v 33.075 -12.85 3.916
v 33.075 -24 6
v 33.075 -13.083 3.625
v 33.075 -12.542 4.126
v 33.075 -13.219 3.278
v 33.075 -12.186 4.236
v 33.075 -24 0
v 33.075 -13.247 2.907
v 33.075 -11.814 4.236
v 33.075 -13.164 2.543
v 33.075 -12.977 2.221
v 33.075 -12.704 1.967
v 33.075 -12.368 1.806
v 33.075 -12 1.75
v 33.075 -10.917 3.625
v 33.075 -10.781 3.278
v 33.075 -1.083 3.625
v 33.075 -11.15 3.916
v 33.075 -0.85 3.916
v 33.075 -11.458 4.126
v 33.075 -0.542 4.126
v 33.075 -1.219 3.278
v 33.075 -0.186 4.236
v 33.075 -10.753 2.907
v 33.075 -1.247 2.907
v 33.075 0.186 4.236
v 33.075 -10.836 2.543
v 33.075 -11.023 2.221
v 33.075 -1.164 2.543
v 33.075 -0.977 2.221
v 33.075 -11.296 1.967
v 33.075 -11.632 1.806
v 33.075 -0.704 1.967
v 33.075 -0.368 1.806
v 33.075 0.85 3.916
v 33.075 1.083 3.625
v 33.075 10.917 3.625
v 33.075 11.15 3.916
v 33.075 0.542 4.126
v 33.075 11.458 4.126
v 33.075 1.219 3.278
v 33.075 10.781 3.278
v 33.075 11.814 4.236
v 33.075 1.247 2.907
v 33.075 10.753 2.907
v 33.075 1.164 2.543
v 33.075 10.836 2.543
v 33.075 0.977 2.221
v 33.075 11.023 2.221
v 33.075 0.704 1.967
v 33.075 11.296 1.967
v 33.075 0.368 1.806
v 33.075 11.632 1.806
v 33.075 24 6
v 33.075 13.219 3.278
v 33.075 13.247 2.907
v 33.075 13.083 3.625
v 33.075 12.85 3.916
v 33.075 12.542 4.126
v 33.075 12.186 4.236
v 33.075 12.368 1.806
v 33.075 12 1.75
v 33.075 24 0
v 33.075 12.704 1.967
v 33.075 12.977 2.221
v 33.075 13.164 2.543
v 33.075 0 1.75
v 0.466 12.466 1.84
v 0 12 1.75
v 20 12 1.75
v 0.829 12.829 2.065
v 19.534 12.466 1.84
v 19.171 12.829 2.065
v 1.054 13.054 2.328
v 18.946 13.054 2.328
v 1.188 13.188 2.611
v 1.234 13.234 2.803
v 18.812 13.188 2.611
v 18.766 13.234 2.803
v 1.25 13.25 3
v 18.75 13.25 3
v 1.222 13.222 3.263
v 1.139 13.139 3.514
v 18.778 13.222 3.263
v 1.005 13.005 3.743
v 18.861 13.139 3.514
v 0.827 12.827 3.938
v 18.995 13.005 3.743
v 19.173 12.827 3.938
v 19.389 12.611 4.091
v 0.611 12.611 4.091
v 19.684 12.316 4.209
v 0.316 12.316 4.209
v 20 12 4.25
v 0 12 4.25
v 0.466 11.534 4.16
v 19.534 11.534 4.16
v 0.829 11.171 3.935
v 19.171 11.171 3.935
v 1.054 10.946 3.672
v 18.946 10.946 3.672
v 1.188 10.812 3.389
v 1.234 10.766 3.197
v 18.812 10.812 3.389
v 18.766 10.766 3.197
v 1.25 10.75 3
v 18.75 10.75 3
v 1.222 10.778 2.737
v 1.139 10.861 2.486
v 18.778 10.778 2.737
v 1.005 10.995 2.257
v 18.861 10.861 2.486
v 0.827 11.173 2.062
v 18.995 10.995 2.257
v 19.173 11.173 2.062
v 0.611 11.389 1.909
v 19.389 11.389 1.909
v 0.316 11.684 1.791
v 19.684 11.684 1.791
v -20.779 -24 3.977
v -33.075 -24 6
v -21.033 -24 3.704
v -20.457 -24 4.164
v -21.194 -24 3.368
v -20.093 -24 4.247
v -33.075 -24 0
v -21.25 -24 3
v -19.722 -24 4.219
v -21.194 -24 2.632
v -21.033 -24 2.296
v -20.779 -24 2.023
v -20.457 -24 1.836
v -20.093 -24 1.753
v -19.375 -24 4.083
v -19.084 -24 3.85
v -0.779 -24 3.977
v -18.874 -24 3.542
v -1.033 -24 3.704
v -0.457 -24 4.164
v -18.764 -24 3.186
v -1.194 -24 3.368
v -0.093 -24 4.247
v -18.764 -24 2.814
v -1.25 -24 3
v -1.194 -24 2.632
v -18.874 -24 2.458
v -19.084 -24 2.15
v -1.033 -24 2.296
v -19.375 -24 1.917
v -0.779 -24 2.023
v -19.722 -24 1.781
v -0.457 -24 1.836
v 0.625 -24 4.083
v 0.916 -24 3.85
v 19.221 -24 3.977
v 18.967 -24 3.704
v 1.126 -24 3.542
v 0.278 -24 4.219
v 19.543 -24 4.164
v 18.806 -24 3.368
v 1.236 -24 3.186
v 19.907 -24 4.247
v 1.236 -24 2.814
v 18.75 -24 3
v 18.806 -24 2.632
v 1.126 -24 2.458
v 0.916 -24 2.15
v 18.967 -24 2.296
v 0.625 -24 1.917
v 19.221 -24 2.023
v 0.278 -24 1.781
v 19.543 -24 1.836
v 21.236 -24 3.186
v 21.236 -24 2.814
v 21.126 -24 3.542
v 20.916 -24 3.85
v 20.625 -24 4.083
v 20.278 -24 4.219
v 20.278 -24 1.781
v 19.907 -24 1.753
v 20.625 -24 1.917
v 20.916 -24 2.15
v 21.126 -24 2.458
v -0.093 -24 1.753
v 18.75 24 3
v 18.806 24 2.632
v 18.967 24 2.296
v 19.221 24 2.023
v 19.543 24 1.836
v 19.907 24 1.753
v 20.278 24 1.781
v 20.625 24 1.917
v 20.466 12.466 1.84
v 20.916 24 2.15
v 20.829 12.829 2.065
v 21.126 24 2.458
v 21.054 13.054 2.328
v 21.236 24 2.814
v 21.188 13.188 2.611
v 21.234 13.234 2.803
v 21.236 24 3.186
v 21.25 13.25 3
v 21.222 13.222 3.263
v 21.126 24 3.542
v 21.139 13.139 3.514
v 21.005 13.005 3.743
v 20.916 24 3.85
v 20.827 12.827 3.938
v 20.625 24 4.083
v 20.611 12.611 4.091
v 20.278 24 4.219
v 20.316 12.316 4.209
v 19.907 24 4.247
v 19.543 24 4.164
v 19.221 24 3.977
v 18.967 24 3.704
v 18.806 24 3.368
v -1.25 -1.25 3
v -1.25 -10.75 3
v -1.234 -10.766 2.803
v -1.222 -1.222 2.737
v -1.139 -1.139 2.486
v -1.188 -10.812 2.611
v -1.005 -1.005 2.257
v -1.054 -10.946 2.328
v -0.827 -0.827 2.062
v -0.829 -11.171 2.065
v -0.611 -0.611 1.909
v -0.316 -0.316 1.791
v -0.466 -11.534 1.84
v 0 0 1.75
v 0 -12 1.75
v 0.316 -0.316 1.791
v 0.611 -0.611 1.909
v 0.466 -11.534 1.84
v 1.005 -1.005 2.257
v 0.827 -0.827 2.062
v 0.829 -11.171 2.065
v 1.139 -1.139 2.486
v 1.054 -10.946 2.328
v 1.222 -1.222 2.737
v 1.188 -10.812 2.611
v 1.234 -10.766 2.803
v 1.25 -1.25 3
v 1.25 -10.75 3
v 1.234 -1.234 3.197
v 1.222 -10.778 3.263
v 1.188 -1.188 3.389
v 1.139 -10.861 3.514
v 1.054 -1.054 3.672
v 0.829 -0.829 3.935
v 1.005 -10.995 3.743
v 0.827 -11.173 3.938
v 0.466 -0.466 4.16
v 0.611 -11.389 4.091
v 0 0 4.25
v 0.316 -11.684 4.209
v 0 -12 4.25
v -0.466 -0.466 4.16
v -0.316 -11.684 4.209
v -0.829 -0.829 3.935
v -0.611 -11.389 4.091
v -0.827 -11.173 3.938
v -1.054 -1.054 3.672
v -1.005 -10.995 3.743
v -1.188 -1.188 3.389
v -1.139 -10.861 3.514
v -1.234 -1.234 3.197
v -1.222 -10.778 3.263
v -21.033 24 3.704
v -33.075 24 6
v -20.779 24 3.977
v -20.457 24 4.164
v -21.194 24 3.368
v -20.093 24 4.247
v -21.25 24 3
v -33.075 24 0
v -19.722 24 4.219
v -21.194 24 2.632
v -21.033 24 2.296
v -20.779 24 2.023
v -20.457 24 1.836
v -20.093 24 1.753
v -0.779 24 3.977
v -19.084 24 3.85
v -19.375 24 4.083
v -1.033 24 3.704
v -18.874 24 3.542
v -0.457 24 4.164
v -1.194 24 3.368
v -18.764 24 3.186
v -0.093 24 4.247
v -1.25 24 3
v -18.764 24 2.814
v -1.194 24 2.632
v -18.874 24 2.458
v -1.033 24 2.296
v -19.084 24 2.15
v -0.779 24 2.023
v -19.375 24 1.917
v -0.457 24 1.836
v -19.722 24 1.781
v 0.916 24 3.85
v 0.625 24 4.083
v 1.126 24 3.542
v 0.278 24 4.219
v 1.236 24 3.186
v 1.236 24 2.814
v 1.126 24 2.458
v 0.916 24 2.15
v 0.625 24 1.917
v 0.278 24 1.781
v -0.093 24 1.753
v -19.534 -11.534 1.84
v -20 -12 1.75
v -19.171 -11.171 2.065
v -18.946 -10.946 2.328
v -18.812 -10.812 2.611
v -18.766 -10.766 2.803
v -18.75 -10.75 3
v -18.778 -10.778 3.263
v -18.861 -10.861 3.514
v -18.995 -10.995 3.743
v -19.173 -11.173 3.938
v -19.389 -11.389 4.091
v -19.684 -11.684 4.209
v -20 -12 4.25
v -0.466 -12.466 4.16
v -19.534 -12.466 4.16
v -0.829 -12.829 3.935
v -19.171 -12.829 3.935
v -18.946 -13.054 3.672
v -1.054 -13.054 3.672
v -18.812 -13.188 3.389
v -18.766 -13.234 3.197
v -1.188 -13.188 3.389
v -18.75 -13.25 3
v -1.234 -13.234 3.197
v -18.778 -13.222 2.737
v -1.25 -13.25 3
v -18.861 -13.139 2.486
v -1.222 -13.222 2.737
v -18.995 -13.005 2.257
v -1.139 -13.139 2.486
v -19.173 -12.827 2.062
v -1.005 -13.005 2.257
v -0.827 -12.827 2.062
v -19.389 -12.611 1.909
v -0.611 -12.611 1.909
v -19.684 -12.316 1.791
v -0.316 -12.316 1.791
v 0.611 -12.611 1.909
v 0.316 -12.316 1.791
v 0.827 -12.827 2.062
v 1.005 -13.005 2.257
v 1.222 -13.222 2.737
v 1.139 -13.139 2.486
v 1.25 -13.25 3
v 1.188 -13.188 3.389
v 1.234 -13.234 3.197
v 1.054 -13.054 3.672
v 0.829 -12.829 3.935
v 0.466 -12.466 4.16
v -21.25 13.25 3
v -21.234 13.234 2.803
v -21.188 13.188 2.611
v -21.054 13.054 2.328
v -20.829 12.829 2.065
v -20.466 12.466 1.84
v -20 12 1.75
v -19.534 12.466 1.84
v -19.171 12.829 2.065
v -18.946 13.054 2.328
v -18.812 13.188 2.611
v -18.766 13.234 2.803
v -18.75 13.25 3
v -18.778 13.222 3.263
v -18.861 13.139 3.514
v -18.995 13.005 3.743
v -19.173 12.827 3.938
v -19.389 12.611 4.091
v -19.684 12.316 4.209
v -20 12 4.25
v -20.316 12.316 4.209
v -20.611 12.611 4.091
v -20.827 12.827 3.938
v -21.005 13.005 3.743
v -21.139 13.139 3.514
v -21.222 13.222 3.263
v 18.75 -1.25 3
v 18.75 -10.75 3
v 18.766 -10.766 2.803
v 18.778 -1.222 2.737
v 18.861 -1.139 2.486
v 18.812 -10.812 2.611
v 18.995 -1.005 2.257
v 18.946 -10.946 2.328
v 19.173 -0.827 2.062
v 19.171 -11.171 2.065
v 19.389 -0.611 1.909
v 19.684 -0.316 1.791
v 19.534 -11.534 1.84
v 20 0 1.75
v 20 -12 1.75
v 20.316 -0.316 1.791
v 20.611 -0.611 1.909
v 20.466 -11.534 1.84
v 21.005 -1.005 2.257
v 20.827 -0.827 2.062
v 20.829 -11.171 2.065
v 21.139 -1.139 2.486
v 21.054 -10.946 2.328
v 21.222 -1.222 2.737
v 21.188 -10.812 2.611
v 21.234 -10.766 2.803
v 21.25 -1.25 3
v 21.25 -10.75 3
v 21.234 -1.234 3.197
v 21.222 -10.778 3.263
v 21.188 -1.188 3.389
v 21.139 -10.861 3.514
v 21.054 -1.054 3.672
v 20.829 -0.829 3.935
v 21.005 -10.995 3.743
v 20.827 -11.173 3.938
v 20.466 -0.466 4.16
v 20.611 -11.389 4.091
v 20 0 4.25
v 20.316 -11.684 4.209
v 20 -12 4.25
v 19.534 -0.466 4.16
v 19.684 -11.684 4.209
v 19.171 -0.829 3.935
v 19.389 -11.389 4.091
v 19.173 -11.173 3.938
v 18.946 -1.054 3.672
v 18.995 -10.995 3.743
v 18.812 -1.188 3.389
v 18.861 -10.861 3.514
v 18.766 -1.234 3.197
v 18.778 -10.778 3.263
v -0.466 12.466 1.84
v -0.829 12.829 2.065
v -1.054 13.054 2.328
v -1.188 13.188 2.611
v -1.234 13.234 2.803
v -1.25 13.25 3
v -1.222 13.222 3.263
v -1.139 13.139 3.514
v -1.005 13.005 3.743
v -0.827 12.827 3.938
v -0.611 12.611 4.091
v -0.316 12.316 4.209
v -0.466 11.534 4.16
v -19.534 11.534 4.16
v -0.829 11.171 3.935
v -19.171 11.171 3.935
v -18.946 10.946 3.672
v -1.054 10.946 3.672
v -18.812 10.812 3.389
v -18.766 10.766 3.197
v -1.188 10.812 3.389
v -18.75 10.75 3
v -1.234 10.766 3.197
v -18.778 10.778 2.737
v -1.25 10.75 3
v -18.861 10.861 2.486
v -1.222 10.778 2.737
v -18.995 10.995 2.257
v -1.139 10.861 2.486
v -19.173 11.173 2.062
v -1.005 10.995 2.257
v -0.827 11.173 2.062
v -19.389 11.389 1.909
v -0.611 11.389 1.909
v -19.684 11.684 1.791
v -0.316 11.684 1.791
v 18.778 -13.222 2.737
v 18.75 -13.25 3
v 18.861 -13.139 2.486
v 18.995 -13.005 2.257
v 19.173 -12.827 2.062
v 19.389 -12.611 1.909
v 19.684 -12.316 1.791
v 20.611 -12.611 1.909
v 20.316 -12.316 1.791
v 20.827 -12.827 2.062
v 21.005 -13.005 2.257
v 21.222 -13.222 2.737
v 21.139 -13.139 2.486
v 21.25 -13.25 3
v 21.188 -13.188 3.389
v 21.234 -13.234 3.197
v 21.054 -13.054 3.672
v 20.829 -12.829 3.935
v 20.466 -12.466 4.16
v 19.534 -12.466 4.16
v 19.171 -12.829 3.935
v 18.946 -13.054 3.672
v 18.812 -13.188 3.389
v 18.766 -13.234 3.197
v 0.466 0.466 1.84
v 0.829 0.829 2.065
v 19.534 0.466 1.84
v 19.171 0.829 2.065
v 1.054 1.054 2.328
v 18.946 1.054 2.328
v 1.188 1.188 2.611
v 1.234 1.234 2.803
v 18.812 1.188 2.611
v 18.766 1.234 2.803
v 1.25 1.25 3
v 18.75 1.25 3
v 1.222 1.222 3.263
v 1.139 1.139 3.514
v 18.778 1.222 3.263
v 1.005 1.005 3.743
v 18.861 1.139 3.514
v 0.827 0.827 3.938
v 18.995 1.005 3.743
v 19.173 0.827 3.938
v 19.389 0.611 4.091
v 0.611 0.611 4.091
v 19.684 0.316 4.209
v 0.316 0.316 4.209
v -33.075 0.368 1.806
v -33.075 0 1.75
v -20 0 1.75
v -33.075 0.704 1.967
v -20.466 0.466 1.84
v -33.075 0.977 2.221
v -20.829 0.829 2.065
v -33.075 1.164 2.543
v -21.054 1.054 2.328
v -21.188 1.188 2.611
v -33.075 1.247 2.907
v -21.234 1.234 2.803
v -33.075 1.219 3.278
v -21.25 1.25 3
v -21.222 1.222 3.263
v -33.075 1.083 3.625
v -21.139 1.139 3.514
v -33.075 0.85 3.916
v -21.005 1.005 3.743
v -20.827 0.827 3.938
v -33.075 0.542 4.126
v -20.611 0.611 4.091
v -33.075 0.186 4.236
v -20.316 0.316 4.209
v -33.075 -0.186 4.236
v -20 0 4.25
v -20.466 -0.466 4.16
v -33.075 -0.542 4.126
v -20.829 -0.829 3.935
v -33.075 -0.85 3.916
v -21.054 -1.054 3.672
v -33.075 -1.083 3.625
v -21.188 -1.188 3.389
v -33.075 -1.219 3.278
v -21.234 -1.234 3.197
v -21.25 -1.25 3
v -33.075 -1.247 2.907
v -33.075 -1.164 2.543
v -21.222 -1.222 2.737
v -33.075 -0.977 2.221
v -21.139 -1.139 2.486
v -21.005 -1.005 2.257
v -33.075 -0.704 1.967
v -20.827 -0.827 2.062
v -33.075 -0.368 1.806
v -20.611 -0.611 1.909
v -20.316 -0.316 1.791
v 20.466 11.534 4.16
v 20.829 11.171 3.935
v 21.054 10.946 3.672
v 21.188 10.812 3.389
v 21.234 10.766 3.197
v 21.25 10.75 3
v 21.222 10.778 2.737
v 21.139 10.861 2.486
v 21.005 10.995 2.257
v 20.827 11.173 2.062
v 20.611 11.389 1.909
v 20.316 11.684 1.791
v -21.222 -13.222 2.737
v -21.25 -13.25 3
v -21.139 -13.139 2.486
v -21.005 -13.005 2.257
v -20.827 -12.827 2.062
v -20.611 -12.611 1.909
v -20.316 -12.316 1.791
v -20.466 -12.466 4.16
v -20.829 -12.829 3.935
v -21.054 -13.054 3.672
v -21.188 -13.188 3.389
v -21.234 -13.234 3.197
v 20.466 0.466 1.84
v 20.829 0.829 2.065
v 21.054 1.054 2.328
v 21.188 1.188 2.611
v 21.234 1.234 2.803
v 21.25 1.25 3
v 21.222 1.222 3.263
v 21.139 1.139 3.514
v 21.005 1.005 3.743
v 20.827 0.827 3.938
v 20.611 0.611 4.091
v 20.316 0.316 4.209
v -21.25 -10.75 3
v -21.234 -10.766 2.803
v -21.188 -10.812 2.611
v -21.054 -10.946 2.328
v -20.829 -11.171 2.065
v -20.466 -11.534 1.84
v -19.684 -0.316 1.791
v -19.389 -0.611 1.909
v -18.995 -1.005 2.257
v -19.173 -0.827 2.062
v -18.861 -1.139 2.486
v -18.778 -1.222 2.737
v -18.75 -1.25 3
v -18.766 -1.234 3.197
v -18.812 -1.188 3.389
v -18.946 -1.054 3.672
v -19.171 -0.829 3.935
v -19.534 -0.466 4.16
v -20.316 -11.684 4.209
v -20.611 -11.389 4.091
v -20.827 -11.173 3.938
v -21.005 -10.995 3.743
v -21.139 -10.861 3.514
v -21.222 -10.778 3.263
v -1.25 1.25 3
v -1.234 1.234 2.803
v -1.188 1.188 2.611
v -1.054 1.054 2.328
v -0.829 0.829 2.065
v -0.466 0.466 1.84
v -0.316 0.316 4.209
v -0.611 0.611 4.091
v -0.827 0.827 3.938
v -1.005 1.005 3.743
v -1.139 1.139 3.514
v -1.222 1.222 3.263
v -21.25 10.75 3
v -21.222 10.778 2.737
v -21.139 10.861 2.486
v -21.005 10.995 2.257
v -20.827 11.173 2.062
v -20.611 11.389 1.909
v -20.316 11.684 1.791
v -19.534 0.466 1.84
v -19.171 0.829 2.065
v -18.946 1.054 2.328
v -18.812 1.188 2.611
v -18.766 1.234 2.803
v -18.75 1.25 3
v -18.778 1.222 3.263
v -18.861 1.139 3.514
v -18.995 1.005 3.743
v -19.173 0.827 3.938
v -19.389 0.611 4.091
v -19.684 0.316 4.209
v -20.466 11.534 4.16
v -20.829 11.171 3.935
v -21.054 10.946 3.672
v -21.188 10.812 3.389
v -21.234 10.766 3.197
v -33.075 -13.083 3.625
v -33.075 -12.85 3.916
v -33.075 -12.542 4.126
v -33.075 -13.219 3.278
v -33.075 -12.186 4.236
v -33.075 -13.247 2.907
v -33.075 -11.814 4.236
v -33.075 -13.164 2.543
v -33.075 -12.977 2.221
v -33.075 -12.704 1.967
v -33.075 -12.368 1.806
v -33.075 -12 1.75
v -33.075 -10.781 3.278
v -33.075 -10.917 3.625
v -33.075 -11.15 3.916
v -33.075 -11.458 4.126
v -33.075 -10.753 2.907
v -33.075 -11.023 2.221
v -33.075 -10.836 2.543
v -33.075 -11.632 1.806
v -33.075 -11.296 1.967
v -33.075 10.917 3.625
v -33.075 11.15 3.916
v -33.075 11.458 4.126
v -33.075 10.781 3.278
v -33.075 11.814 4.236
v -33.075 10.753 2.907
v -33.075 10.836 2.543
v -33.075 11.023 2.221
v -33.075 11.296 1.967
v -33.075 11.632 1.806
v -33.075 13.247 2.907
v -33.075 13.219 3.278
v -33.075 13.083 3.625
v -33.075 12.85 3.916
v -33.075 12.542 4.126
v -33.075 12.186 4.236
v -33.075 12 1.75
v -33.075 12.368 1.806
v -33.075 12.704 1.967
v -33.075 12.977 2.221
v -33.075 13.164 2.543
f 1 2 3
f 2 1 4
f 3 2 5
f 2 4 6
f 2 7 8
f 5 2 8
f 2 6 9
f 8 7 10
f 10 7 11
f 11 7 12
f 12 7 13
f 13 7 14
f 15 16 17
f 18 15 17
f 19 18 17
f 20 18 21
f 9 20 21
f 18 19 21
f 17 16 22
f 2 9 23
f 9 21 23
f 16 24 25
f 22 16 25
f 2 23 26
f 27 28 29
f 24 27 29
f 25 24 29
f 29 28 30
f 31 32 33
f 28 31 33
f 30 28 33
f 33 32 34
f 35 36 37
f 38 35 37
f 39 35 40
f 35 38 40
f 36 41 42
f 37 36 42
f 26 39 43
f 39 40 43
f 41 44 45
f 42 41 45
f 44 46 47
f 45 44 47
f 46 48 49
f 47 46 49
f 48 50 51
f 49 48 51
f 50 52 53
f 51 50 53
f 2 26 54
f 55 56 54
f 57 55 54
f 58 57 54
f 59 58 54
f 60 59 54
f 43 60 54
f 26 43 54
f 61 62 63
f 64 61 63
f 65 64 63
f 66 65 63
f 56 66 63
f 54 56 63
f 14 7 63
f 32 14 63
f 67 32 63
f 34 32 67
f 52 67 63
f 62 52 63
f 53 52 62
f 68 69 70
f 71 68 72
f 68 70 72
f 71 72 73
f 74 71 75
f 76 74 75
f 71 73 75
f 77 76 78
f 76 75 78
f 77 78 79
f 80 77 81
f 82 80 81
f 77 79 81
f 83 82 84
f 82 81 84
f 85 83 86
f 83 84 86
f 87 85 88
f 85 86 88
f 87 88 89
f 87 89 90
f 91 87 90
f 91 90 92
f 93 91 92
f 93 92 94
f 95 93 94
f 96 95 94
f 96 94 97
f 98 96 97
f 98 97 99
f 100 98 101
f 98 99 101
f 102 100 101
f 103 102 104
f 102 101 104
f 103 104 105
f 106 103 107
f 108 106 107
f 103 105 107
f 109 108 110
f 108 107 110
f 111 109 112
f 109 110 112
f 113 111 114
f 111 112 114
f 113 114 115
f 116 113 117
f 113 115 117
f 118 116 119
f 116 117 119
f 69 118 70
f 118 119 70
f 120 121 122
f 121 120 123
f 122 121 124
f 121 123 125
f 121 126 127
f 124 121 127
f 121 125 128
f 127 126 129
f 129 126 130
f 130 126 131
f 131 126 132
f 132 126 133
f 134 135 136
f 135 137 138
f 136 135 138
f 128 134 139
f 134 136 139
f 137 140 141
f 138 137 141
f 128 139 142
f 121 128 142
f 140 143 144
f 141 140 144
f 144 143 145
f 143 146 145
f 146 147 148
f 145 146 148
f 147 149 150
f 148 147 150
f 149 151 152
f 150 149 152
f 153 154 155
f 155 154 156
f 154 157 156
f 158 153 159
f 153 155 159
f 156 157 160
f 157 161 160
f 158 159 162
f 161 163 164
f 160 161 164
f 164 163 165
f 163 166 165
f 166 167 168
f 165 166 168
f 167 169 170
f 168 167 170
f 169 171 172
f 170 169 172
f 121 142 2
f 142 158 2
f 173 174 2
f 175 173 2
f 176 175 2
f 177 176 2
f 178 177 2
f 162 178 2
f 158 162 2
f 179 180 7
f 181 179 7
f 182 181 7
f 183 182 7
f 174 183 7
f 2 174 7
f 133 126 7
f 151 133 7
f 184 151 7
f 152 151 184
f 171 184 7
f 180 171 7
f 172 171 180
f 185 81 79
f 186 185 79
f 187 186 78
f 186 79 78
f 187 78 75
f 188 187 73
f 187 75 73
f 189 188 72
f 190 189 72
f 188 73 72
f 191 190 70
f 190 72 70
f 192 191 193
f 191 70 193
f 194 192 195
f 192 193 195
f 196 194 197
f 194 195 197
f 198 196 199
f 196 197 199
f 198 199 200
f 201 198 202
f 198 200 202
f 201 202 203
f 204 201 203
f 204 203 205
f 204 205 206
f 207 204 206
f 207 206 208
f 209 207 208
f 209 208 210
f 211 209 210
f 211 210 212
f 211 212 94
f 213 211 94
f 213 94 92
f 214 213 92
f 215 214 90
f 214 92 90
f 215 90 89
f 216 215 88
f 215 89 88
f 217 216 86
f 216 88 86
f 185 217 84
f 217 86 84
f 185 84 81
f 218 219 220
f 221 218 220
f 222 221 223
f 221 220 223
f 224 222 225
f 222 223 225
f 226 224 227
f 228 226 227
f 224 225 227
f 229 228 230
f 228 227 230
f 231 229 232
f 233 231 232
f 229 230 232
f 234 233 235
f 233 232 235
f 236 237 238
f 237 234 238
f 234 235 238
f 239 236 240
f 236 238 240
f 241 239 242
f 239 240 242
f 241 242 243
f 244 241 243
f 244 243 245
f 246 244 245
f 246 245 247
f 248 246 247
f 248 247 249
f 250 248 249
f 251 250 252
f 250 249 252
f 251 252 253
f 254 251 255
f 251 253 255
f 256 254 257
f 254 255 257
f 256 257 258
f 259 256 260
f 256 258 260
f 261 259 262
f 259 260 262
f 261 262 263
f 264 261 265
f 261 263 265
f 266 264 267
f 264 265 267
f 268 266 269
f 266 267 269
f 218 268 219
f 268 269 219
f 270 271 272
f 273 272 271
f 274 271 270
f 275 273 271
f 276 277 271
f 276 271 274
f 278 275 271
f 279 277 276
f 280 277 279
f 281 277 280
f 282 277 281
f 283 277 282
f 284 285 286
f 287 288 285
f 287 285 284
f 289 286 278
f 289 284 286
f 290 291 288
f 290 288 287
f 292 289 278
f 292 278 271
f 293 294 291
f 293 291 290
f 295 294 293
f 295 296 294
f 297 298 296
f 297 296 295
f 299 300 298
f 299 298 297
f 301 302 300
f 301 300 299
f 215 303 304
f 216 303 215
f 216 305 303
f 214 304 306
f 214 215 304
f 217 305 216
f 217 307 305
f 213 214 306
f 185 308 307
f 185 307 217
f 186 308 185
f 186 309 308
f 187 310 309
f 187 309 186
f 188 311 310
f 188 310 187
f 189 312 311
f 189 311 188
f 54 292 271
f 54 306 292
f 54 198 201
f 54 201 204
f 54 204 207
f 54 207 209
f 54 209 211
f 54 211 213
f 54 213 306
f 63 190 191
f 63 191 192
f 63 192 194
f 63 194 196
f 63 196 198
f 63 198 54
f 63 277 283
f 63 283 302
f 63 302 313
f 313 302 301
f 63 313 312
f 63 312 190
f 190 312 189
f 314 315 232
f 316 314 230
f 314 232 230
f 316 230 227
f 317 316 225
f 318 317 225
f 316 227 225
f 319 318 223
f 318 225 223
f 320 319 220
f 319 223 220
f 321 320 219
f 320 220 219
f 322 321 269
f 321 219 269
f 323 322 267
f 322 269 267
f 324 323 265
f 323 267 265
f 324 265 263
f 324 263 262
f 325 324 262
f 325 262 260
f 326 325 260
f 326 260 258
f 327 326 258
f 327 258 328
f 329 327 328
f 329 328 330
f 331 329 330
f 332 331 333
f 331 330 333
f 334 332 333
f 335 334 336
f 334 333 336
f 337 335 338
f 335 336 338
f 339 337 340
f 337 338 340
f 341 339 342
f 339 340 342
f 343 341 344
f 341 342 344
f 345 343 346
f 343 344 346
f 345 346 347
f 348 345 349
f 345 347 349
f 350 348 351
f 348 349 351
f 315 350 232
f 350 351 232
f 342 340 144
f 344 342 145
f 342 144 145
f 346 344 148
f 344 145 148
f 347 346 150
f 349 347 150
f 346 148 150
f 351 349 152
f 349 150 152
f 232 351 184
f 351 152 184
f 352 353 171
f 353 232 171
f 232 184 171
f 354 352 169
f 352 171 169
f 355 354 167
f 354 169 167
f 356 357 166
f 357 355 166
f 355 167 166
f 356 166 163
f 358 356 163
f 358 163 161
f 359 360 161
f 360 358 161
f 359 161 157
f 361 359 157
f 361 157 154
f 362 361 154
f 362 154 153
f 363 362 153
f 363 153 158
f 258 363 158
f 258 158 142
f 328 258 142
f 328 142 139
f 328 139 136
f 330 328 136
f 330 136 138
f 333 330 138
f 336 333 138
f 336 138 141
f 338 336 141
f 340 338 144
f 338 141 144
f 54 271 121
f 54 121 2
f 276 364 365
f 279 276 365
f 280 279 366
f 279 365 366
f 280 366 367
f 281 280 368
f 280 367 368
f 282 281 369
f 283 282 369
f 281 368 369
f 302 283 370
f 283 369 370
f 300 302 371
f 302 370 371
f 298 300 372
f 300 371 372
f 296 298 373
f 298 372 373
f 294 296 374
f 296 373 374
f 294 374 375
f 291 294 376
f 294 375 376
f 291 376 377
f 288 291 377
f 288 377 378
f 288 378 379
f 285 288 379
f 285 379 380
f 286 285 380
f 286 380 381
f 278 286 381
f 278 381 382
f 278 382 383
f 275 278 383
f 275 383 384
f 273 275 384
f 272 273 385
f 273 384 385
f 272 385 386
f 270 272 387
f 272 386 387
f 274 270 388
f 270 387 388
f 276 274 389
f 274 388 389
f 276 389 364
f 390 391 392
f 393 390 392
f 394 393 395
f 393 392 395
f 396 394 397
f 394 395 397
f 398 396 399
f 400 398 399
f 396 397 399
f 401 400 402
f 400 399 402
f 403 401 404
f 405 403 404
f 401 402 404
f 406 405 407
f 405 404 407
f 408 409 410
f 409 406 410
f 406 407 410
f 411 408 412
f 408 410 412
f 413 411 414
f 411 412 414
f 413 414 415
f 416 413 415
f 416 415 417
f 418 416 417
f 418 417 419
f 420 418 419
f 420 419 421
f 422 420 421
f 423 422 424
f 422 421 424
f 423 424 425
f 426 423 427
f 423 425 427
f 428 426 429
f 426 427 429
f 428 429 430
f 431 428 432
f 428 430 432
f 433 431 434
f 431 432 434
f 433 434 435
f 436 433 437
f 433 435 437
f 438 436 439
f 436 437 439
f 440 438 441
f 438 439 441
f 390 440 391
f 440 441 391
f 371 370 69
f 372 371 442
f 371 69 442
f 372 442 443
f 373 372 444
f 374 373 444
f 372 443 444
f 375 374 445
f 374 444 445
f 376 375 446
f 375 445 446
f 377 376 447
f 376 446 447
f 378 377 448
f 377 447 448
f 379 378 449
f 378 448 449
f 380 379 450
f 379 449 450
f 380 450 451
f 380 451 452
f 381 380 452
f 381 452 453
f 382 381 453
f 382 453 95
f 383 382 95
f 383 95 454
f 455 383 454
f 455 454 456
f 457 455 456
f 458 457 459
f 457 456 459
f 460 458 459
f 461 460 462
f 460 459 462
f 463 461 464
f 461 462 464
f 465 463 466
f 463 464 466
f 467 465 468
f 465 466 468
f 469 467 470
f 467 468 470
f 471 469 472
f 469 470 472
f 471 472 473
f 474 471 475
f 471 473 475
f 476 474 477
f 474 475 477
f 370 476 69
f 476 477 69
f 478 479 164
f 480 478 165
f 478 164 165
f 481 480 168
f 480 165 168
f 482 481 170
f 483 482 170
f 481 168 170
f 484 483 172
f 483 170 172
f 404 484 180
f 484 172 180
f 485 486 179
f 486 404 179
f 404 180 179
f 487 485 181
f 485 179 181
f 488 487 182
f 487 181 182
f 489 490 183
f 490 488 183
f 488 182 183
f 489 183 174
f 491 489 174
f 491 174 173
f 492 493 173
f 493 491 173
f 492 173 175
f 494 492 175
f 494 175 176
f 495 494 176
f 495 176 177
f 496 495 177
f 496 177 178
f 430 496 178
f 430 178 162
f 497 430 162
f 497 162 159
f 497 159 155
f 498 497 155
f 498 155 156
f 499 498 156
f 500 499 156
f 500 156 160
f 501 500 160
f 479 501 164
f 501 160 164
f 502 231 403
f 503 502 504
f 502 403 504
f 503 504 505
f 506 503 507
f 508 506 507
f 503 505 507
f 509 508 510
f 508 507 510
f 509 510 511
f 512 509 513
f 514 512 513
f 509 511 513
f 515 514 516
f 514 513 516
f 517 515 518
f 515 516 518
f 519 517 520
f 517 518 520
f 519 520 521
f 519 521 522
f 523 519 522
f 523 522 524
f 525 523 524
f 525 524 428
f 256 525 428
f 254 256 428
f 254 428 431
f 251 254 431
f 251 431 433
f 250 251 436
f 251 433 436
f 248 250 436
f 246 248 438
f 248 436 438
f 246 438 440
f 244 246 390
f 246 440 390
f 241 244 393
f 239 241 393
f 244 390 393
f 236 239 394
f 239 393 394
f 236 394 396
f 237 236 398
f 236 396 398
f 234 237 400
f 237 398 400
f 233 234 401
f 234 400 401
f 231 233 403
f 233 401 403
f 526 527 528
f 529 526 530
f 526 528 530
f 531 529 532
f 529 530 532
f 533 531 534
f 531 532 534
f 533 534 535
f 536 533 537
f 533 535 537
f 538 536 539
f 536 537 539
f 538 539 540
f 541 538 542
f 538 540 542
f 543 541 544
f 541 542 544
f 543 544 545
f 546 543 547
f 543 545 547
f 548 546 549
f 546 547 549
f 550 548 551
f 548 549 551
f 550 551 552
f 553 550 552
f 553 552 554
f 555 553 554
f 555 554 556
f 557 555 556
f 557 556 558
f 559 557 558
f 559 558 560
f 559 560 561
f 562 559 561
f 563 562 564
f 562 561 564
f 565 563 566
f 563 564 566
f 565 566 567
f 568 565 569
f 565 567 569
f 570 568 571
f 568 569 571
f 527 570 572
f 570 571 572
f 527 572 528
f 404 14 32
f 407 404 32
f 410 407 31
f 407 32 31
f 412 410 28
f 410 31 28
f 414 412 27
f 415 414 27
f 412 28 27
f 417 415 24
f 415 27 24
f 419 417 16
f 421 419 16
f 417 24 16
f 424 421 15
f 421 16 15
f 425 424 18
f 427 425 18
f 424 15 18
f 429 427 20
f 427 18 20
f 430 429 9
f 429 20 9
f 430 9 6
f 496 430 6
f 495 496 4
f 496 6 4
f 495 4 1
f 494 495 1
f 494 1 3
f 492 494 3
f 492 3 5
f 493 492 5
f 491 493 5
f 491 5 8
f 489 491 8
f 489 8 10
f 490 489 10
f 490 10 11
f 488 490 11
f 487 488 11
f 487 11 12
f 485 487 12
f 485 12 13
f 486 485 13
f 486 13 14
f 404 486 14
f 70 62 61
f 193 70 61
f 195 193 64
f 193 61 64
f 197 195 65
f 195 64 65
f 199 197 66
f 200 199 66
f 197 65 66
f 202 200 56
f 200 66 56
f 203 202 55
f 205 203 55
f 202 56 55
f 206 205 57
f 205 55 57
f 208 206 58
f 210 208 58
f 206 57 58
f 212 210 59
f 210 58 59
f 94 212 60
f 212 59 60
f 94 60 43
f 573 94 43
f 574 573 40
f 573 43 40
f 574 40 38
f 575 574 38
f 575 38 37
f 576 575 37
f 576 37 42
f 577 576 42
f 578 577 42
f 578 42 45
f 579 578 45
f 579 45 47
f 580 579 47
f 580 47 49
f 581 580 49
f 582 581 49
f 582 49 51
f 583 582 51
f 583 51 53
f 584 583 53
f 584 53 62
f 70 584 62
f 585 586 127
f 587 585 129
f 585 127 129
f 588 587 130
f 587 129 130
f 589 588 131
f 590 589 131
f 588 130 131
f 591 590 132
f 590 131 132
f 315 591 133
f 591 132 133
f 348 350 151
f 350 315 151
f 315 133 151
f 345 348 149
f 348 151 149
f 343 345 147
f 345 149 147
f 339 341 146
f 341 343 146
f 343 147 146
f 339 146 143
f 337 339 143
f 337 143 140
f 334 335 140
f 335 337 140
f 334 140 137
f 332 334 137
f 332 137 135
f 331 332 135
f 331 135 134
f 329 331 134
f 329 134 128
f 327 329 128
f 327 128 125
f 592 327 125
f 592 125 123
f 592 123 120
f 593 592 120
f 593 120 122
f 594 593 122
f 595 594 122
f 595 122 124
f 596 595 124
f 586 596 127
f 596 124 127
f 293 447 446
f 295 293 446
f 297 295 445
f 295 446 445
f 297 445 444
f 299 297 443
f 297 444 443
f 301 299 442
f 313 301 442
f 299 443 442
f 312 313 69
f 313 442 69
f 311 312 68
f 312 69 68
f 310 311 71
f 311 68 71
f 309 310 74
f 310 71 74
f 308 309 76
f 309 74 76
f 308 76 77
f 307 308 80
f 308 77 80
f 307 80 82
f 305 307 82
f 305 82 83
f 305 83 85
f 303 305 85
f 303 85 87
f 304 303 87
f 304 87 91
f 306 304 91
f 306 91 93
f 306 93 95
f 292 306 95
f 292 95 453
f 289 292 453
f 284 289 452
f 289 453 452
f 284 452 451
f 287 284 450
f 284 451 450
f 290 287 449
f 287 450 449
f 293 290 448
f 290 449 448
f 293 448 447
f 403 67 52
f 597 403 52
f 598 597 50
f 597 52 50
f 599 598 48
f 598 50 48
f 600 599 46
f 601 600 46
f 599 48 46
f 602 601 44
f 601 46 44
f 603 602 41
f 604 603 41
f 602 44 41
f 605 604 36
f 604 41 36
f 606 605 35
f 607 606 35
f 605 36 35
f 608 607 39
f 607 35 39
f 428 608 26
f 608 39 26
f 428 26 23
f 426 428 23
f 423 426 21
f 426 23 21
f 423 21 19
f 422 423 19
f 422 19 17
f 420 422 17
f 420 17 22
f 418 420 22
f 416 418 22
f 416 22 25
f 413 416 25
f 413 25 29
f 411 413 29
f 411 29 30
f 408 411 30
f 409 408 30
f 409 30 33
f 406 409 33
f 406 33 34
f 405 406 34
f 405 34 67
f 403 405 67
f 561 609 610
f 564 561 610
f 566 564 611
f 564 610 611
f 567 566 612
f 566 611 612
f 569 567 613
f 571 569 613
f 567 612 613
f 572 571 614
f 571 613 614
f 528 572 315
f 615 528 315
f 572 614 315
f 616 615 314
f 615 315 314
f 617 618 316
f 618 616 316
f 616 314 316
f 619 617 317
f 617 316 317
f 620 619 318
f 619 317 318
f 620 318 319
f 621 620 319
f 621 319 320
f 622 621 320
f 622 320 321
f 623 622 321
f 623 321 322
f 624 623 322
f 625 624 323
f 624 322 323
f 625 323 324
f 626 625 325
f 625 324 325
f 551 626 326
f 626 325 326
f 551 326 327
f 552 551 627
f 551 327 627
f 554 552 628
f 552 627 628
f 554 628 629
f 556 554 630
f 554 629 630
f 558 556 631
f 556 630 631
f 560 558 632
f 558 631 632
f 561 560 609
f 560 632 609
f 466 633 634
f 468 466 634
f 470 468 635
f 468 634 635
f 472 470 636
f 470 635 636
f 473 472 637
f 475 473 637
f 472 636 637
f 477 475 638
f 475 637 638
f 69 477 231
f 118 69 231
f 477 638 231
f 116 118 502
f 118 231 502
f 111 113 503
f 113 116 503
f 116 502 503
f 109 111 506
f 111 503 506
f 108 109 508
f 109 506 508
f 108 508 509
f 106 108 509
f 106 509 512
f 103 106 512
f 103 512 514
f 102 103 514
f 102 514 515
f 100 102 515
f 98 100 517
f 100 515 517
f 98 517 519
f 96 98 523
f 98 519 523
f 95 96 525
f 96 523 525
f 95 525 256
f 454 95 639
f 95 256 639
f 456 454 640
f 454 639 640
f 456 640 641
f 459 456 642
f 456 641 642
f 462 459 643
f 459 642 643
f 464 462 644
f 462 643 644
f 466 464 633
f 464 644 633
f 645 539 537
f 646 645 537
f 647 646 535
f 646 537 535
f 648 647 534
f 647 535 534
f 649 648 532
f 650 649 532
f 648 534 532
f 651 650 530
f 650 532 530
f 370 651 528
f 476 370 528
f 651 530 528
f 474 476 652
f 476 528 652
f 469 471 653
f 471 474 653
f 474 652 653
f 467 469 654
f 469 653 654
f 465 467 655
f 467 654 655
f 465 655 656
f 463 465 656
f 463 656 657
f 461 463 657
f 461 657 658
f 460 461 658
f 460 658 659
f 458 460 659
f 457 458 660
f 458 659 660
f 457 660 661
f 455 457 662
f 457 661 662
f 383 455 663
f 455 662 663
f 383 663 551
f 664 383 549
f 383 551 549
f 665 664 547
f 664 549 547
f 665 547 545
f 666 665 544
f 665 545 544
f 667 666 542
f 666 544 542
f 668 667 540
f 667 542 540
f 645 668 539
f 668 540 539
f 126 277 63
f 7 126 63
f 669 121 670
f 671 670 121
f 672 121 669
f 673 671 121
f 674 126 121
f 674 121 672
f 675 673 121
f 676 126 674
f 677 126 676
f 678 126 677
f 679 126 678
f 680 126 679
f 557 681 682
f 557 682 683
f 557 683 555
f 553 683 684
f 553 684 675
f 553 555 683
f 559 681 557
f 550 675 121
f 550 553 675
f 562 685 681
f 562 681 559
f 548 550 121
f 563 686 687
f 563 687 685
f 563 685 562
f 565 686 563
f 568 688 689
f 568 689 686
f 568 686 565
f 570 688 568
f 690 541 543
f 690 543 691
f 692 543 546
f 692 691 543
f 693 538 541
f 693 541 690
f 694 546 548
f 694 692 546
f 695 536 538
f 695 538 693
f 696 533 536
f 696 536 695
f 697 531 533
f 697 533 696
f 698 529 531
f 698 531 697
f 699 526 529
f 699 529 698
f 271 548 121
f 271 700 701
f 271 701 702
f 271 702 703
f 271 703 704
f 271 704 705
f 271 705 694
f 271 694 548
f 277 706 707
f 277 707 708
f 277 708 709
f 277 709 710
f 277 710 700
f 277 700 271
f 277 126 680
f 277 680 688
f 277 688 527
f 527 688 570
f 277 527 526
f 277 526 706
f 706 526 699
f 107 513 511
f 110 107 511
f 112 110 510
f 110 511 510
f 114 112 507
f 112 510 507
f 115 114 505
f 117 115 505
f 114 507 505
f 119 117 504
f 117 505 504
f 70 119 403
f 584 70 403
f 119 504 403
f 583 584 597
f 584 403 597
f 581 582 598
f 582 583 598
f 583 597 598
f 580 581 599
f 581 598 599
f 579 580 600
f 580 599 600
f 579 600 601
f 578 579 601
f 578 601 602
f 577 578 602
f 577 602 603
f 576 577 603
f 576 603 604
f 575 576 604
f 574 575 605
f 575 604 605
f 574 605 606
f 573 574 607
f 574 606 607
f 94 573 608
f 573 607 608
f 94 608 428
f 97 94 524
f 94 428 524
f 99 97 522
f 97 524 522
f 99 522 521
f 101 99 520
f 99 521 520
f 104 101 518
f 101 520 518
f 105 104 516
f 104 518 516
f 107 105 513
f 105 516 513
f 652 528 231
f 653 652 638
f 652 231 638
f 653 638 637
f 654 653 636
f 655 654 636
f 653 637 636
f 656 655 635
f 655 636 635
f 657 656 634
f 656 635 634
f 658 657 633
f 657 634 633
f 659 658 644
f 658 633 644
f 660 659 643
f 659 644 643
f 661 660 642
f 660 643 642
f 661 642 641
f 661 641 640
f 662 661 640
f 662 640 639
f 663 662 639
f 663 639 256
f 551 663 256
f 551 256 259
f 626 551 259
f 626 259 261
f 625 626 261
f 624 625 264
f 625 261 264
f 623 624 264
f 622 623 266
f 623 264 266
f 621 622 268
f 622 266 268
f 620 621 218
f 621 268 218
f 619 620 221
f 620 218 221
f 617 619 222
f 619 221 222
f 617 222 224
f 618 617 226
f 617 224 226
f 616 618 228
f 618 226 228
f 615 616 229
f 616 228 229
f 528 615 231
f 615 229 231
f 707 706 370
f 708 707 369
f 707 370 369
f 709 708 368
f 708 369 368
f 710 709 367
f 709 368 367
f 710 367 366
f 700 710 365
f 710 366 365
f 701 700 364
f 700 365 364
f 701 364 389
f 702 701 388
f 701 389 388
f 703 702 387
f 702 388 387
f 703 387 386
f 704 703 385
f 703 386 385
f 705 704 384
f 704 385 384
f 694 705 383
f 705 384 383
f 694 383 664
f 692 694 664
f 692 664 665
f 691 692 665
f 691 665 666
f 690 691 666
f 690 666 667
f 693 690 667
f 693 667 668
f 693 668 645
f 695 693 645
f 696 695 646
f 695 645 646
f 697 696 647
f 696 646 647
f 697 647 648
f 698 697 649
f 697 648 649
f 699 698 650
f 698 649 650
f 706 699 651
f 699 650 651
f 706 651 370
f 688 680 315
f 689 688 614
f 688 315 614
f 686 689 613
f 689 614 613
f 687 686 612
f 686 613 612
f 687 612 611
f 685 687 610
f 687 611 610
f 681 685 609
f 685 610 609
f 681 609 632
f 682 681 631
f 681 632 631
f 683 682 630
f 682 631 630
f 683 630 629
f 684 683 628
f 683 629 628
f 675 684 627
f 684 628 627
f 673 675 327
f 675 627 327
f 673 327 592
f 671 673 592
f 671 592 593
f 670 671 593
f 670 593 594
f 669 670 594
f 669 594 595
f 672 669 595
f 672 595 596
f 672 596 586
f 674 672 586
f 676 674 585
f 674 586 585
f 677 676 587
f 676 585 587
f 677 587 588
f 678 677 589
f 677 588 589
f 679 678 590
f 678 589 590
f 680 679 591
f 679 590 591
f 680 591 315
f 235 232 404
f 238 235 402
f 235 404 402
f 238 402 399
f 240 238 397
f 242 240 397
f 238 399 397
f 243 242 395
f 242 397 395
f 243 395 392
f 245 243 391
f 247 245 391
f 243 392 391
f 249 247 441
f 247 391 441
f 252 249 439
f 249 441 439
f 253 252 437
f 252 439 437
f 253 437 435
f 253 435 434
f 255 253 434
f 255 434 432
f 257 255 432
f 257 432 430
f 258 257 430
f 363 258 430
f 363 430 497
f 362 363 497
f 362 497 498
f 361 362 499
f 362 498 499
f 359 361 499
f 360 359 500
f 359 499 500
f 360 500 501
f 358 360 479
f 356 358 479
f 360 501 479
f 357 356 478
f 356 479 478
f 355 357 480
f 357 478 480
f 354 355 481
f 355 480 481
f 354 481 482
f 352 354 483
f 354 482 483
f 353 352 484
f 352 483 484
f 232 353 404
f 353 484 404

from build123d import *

# Parameters (mm, degrees)
SKETCH_1_W         = 66.15
SKETCH_1_H         = 48
EXTRUDE_1_DEPTH    = 6
HOLE_WIZARD_M3_2_D = 2.5
HOLE_WIZARD_M3_3_D = 2.5


with BuildPart() as part:
    # 草图1 → 凸台-拉伸1 (new body)
    with BuildSketch(Plane.XY):
        Rectangle(SKETCH_1_W, SKETCH_1_H)
    extrude(amount=EXTRUDE_1_DEPTH)

    # M3 螺纹孔2 (through all)
    with Locations(Plane.ZY.offset(33.075)):
        with Locations((3, 12), (3, -12), (3, 0)):
            Hole(HOLE_WIZARD_M3_2_D / 2)

    # M3 螺纹孔3 (through all)
    with Locations(Plane(origin=(0, 24, 0), x_dir=(1, 0, 0), z_dir=(0, 1, 0))):
        with Locations((0, -3), (20, -3), (-20, -3)):
            Hole(HOLE_WIZARD_M3_3_D / 2)


solid = part.part
